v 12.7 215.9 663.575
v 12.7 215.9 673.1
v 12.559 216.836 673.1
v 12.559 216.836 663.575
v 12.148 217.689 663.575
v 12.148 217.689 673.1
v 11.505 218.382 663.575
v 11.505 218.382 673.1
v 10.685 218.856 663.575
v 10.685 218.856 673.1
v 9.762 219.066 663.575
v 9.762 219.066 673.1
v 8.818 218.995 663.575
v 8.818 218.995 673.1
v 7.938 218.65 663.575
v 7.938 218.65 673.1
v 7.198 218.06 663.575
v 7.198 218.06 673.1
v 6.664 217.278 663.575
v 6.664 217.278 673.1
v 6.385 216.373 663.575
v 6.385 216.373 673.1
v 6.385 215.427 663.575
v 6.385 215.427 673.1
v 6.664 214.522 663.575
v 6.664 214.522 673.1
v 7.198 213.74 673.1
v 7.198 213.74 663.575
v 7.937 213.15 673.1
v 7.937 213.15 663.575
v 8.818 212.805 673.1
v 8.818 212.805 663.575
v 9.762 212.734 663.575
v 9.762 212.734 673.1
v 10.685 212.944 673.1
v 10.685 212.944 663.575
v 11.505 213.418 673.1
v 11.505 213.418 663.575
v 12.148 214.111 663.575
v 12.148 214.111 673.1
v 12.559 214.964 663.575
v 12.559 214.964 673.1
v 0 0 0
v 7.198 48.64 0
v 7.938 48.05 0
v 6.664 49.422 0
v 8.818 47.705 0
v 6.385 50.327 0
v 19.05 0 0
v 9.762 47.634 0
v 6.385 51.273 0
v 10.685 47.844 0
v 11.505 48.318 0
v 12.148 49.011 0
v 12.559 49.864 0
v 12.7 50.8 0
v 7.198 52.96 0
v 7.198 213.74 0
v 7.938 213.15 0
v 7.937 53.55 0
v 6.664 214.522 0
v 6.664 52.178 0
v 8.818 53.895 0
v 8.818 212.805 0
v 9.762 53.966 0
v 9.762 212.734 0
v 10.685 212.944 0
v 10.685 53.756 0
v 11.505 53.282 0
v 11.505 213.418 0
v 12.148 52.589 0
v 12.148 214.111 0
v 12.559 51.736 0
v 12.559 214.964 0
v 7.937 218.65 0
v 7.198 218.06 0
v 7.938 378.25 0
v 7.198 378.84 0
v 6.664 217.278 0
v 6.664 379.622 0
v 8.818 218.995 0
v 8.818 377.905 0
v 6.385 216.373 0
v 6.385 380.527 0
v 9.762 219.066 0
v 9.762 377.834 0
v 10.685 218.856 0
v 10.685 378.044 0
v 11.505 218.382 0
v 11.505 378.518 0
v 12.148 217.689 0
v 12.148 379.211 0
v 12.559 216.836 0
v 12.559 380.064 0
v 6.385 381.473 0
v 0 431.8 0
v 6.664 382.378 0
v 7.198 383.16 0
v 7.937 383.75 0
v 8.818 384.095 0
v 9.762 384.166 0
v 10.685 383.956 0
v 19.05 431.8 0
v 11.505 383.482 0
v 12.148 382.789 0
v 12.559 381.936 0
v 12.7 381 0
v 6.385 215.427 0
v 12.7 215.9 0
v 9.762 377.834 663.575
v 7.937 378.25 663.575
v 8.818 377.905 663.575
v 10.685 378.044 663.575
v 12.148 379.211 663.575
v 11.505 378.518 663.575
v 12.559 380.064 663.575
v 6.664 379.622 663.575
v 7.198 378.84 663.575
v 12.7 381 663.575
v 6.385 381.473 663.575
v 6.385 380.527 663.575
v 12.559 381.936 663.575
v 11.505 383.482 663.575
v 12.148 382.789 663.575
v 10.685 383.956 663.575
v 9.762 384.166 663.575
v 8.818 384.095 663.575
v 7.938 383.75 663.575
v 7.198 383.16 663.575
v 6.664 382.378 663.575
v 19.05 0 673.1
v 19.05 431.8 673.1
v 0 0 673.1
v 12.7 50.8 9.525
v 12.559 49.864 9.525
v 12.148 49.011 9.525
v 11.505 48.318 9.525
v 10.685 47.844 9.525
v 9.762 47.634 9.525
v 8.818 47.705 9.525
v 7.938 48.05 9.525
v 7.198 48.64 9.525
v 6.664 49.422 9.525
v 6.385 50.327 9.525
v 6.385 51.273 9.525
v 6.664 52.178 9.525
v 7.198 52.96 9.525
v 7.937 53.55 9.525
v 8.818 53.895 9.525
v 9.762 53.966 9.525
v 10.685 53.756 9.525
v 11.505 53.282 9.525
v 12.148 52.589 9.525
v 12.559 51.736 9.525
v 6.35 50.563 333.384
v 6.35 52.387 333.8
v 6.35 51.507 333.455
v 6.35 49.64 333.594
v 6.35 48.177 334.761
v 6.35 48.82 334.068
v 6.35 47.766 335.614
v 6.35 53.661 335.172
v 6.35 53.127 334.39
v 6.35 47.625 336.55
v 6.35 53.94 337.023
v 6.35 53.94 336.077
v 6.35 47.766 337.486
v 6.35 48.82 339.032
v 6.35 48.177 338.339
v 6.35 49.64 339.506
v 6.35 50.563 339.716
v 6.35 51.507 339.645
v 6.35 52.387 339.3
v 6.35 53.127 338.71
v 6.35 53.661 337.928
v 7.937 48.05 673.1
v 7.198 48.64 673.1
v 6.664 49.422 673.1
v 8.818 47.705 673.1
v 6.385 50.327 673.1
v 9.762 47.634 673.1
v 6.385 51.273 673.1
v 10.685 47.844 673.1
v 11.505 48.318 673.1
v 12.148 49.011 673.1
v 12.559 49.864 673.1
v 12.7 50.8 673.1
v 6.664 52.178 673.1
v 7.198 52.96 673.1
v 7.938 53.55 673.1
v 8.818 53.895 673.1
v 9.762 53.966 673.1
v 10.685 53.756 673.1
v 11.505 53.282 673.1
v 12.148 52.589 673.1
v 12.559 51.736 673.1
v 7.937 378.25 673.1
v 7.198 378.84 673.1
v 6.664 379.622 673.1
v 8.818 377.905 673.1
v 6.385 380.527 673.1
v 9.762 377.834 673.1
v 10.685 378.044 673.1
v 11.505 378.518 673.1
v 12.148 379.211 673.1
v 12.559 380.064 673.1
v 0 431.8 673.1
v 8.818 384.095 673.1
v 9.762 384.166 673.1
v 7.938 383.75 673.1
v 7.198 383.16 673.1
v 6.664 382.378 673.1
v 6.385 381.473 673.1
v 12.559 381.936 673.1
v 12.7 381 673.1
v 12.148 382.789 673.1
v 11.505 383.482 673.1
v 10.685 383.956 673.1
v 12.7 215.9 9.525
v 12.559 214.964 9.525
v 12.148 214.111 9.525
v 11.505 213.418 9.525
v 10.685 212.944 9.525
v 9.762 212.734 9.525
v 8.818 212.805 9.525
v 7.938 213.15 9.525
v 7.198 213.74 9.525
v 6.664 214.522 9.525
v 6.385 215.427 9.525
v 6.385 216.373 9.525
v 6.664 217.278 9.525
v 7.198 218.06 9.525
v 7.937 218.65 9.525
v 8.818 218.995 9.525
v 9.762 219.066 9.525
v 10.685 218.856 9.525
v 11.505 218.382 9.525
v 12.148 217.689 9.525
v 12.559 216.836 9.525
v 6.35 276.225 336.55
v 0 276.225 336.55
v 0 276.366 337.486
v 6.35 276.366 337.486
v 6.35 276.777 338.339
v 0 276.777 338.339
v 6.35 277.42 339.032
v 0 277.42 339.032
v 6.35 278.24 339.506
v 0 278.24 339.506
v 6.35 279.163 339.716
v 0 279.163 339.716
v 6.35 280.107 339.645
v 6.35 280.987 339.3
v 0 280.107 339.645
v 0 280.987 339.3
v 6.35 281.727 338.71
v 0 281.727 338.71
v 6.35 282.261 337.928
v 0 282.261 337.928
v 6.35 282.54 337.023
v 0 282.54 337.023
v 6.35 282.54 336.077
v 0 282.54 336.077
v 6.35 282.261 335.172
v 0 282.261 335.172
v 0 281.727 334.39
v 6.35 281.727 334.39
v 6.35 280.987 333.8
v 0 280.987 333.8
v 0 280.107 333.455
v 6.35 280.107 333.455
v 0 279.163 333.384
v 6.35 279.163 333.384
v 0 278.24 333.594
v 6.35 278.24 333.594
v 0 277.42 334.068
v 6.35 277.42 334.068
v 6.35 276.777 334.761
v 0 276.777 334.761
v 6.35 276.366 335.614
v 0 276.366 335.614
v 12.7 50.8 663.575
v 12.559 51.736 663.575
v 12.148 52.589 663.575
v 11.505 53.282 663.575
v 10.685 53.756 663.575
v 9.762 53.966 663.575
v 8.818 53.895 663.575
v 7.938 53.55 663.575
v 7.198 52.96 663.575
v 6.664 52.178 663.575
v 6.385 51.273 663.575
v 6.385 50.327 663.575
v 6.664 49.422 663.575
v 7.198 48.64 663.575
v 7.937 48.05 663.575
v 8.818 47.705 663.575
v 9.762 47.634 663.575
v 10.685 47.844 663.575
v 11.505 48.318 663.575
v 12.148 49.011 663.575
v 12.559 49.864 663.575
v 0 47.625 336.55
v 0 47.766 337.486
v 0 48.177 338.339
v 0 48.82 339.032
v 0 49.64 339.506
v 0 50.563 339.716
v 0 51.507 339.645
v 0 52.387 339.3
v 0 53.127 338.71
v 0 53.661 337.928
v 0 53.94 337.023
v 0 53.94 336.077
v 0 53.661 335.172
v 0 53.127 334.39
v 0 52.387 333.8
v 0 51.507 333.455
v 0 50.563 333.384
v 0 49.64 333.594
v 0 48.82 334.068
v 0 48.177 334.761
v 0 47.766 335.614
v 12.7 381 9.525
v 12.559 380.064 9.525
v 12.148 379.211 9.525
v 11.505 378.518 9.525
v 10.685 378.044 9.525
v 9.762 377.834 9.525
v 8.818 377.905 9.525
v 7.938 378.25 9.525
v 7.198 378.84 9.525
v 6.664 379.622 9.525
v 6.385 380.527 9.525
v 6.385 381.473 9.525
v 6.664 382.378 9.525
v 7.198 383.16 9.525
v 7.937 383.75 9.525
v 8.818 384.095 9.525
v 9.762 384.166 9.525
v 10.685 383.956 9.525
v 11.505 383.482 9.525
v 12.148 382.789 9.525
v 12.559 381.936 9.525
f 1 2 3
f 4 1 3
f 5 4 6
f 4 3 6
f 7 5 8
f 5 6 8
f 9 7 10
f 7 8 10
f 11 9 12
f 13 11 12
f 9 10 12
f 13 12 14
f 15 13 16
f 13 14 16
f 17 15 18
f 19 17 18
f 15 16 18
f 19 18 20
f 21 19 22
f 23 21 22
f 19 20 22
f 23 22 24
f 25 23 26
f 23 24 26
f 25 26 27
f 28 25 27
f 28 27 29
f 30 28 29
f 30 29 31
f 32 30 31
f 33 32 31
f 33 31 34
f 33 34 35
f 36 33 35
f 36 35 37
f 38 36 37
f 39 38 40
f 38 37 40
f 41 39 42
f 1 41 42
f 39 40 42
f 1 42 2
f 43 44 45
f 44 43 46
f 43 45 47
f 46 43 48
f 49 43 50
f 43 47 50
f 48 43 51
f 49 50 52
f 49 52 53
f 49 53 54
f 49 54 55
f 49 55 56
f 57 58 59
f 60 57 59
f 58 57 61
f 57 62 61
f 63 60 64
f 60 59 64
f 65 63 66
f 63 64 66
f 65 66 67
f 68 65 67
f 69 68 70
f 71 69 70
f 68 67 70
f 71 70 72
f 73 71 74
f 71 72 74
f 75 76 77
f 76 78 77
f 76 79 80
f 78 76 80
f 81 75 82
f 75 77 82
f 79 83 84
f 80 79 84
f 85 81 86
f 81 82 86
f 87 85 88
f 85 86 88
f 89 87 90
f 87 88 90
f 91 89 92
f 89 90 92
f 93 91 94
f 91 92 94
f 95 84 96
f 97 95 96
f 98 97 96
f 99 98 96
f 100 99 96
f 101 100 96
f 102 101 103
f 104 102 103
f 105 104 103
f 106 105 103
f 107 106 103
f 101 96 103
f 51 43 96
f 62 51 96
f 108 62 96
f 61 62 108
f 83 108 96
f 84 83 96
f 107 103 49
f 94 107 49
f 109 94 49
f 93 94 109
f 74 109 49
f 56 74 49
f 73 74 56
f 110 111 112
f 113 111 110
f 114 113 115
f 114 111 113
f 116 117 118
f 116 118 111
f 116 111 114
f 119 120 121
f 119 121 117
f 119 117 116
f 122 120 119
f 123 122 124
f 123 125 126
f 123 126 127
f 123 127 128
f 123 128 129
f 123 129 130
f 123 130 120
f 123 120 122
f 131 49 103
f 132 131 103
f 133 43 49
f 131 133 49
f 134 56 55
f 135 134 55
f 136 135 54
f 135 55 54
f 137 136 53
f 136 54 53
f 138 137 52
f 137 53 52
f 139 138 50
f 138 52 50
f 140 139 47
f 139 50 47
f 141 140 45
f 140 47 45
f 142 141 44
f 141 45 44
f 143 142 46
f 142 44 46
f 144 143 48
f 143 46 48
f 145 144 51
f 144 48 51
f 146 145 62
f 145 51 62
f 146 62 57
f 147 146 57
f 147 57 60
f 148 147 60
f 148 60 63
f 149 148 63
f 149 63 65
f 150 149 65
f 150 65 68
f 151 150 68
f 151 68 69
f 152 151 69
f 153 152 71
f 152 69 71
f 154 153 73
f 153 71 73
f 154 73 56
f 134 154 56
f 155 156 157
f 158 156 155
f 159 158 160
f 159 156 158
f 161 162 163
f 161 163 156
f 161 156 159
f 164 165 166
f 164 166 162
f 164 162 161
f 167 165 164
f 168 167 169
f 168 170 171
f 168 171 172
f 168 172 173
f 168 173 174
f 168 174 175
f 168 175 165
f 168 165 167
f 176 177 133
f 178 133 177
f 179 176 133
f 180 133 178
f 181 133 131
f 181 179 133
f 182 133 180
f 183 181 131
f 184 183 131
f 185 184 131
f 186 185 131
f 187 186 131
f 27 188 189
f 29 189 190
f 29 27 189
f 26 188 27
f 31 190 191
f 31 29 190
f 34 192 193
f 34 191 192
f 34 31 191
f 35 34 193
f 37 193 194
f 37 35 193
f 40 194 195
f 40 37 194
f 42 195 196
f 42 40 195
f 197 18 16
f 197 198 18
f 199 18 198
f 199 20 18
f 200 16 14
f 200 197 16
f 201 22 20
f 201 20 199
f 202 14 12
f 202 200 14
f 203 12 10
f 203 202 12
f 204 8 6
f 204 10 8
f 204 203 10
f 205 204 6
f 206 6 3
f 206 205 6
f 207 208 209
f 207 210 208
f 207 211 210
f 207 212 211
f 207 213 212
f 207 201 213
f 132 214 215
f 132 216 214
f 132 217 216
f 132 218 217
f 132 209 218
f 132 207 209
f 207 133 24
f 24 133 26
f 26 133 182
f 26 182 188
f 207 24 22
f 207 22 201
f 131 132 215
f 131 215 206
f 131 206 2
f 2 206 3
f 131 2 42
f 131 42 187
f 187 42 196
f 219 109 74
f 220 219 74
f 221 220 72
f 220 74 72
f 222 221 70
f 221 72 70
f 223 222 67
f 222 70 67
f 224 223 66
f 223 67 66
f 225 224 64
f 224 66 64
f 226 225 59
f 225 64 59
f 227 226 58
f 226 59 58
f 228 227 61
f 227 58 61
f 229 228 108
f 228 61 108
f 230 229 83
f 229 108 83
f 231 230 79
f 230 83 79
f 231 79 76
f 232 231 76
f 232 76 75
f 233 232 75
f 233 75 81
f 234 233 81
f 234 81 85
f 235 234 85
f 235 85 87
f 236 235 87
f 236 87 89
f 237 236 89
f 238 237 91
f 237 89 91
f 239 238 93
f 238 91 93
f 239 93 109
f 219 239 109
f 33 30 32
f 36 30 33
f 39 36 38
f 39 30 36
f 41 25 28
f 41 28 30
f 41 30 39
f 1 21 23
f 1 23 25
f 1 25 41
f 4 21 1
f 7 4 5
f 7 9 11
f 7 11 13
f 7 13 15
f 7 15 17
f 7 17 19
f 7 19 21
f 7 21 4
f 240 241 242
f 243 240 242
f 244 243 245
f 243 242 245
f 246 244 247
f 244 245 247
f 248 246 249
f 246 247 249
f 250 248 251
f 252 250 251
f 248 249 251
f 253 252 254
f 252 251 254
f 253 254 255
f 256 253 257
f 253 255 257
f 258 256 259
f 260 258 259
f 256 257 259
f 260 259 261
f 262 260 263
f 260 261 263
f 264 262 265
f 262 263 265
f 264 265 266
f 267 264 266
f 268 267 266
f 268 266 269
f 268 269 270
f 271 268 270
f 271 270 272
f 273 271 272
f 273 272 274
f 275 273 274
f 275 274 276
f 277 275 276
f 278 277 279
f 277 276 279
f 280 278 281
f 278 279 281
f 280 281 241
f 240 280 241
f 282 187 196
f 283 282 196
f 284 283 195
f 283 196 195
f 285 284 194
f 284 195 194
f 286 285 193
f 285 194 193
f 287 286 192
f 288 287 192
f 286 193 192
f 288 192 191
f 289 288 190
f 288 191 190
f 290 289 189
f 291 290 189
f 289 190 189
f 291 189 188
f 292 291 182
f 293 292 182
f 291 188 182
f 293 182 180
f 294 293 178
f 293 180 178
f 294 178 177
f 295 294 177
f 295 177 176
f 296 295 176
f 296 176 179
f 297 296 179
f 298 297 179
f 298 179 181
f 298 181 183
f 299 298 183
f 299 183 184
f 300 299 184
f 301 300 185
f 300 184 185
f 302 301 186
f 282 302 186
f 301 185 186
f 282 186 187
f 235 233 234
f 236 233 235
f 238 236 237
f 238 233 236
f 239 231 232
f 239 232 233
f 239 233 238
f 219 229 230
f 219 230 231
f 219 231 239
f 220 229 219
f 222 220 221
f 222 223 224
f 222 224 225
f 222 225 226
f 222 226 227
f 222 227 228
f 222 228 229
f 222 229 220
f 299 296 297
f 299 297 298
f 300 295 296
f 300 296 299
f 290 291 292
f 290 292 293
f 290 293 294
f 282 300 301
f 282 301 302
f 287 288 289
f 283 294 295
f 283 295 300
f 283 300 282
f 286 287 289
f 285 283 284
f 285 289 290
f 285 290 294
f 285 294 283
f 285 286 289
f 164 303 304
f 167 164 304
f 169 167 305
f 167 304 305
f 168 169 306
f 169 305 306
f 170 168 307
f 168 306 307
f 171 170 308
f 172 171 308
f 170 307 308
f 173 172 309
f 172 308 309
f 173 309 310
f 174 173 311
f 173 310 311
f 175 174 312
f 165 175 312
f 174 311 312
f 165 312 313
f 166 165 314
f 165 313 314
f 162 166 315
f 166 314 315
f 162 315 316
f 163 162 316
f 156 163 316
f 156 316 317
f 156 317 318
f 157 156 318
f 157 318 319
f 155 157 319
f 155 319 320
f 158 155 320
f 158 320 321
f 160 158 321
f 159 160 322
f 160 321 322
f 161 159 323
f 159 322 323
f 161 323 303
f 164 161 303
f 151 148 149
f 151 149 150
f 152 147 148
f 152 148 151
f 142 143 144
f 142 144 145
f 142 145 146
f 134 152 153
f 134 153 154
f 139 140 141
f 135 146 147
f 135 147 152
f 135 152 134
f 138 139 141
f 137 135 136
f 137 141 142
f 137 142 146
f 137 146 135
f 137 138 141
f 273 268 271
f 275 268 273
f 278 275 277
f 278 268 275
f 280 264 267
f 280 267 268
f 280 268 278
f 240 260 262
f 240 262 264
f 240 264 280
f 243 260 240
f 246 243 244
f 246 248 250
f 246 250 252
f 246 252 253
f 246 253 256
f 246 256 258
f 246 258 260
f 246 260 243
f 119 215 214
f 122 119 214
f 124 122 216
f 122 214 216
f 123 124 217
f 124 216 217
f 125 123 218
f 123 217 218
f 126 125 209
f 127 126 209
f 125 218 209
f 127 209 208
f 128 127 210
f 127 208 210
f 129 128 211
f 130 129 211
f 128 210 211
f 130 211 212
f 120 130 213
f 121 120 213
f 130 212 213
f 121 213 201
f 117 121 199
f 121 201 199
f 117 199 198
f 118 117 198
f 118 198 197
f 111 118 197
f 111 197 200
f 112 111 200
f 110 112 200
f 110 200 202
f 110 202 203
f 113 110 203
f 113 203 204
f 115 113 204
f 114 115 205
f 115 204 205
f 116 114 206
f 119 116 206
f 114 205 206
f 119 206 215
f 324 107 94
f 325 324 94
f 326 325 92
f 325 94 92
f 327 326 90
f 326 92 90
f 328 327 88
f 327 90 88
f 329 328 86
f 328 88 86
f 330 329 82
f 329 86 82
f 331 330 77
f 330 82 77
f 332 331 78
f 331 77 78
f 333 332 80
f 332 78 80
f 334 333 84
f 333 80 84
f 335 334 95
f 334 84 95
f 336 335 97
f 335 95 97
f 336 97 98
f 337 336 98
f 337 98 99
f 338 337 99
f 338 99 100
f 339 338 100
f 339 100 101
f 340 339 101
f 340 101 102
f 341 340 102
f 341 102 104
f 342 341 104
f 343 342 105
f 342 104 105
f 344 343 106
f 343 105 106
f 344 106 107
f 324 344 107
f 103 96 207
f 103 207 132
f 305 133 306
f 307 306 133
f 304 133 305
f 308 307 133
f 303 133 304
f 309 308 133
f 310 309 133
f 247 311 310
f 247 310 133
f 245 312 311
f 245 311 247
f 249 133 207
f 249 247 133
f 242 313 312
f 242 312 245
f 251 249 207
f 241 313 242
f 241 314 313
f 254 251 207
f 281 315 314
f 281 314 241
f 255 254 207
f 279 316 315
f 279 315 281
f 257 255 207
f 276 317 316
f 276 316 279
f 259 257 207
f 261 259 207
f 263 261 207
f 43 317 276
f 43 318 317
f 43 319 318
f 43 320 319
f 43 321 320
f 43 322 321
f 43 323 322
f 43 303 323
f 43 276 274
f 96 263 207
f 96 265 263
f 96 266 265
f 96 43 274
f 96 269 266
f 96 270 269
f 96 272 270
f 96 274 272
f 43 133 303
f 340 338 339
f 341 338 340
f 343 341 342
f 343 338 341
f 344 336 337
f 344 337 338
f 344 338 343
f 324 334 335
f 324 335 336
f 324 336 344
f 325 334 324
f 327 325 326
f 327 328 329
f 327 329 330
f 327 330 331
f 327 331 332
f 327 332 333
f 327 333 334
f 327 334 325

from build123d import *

# Parameters (mm, degrees)
F0_W     = 19.05
F0_H     = 431.8
F1_DEPTH = 673.1
F2_R     = 3.175
F3_DEPTH = 9.525
F4_R     = 3.175
F5_DEPTH = 9.525
F6_R     = 3.175
F7_DEPTH = 6.35


with BuildPart() as f1:
    # F0 (on Top) → F1 (new body)
    with BuildSketch(Plane.XY):
        with Locations((9.525, 215.9)):
            Rectangle(F0_W, F0_H)
    extrude(amount=F1_DEPTH)

    # F2 (on face) → F3 (cut)
    with BuildSketch(Plane(origin=(0, 0, 0), x_dir=(1, 0, 0), z_dir=(0, 0, -1))):
        with Locations((9.525, -50.8)):
            Circle(F2_R)
        with Locations((9.525, -215.9)):
            Circle(F2_R)
        with Locations((9.525, -381)):
            Circle(F2_R)
    extrude(amount=-F3_DEPTH, mode=Mode.SUBTRACT)

    # F4 (on face) → F5 (cut)
    with BuildSketch(Plane.XY.offset(673.1)):
        with Locations((9.525, 381)):
            Circle(F4_R)
        with Locations((9.525, 215.9)):
            Circle(F4_R)
        with Locations((9.525, 50.8)):
            Circle(F4_R)
    extrude(amount=-F5_DEPTH, mode=Mode.SUBTRACT)

    # F6 (on face) → F7 (cut)
    with BuildSketch(Plane(origin=(0, 0, 0), x_dir=(0, -1, 0), z_dir=(-1, 0, 0))):
        with Locations((-279.4, 336.55)):
            Circle(F6_R)
        with Locations((-50.8, 336.55)):
            Circle(F6_R)
    extrude(amount=-F7_DEPTH, mode=Mode.SUBTRACT)


solid = f1.part
